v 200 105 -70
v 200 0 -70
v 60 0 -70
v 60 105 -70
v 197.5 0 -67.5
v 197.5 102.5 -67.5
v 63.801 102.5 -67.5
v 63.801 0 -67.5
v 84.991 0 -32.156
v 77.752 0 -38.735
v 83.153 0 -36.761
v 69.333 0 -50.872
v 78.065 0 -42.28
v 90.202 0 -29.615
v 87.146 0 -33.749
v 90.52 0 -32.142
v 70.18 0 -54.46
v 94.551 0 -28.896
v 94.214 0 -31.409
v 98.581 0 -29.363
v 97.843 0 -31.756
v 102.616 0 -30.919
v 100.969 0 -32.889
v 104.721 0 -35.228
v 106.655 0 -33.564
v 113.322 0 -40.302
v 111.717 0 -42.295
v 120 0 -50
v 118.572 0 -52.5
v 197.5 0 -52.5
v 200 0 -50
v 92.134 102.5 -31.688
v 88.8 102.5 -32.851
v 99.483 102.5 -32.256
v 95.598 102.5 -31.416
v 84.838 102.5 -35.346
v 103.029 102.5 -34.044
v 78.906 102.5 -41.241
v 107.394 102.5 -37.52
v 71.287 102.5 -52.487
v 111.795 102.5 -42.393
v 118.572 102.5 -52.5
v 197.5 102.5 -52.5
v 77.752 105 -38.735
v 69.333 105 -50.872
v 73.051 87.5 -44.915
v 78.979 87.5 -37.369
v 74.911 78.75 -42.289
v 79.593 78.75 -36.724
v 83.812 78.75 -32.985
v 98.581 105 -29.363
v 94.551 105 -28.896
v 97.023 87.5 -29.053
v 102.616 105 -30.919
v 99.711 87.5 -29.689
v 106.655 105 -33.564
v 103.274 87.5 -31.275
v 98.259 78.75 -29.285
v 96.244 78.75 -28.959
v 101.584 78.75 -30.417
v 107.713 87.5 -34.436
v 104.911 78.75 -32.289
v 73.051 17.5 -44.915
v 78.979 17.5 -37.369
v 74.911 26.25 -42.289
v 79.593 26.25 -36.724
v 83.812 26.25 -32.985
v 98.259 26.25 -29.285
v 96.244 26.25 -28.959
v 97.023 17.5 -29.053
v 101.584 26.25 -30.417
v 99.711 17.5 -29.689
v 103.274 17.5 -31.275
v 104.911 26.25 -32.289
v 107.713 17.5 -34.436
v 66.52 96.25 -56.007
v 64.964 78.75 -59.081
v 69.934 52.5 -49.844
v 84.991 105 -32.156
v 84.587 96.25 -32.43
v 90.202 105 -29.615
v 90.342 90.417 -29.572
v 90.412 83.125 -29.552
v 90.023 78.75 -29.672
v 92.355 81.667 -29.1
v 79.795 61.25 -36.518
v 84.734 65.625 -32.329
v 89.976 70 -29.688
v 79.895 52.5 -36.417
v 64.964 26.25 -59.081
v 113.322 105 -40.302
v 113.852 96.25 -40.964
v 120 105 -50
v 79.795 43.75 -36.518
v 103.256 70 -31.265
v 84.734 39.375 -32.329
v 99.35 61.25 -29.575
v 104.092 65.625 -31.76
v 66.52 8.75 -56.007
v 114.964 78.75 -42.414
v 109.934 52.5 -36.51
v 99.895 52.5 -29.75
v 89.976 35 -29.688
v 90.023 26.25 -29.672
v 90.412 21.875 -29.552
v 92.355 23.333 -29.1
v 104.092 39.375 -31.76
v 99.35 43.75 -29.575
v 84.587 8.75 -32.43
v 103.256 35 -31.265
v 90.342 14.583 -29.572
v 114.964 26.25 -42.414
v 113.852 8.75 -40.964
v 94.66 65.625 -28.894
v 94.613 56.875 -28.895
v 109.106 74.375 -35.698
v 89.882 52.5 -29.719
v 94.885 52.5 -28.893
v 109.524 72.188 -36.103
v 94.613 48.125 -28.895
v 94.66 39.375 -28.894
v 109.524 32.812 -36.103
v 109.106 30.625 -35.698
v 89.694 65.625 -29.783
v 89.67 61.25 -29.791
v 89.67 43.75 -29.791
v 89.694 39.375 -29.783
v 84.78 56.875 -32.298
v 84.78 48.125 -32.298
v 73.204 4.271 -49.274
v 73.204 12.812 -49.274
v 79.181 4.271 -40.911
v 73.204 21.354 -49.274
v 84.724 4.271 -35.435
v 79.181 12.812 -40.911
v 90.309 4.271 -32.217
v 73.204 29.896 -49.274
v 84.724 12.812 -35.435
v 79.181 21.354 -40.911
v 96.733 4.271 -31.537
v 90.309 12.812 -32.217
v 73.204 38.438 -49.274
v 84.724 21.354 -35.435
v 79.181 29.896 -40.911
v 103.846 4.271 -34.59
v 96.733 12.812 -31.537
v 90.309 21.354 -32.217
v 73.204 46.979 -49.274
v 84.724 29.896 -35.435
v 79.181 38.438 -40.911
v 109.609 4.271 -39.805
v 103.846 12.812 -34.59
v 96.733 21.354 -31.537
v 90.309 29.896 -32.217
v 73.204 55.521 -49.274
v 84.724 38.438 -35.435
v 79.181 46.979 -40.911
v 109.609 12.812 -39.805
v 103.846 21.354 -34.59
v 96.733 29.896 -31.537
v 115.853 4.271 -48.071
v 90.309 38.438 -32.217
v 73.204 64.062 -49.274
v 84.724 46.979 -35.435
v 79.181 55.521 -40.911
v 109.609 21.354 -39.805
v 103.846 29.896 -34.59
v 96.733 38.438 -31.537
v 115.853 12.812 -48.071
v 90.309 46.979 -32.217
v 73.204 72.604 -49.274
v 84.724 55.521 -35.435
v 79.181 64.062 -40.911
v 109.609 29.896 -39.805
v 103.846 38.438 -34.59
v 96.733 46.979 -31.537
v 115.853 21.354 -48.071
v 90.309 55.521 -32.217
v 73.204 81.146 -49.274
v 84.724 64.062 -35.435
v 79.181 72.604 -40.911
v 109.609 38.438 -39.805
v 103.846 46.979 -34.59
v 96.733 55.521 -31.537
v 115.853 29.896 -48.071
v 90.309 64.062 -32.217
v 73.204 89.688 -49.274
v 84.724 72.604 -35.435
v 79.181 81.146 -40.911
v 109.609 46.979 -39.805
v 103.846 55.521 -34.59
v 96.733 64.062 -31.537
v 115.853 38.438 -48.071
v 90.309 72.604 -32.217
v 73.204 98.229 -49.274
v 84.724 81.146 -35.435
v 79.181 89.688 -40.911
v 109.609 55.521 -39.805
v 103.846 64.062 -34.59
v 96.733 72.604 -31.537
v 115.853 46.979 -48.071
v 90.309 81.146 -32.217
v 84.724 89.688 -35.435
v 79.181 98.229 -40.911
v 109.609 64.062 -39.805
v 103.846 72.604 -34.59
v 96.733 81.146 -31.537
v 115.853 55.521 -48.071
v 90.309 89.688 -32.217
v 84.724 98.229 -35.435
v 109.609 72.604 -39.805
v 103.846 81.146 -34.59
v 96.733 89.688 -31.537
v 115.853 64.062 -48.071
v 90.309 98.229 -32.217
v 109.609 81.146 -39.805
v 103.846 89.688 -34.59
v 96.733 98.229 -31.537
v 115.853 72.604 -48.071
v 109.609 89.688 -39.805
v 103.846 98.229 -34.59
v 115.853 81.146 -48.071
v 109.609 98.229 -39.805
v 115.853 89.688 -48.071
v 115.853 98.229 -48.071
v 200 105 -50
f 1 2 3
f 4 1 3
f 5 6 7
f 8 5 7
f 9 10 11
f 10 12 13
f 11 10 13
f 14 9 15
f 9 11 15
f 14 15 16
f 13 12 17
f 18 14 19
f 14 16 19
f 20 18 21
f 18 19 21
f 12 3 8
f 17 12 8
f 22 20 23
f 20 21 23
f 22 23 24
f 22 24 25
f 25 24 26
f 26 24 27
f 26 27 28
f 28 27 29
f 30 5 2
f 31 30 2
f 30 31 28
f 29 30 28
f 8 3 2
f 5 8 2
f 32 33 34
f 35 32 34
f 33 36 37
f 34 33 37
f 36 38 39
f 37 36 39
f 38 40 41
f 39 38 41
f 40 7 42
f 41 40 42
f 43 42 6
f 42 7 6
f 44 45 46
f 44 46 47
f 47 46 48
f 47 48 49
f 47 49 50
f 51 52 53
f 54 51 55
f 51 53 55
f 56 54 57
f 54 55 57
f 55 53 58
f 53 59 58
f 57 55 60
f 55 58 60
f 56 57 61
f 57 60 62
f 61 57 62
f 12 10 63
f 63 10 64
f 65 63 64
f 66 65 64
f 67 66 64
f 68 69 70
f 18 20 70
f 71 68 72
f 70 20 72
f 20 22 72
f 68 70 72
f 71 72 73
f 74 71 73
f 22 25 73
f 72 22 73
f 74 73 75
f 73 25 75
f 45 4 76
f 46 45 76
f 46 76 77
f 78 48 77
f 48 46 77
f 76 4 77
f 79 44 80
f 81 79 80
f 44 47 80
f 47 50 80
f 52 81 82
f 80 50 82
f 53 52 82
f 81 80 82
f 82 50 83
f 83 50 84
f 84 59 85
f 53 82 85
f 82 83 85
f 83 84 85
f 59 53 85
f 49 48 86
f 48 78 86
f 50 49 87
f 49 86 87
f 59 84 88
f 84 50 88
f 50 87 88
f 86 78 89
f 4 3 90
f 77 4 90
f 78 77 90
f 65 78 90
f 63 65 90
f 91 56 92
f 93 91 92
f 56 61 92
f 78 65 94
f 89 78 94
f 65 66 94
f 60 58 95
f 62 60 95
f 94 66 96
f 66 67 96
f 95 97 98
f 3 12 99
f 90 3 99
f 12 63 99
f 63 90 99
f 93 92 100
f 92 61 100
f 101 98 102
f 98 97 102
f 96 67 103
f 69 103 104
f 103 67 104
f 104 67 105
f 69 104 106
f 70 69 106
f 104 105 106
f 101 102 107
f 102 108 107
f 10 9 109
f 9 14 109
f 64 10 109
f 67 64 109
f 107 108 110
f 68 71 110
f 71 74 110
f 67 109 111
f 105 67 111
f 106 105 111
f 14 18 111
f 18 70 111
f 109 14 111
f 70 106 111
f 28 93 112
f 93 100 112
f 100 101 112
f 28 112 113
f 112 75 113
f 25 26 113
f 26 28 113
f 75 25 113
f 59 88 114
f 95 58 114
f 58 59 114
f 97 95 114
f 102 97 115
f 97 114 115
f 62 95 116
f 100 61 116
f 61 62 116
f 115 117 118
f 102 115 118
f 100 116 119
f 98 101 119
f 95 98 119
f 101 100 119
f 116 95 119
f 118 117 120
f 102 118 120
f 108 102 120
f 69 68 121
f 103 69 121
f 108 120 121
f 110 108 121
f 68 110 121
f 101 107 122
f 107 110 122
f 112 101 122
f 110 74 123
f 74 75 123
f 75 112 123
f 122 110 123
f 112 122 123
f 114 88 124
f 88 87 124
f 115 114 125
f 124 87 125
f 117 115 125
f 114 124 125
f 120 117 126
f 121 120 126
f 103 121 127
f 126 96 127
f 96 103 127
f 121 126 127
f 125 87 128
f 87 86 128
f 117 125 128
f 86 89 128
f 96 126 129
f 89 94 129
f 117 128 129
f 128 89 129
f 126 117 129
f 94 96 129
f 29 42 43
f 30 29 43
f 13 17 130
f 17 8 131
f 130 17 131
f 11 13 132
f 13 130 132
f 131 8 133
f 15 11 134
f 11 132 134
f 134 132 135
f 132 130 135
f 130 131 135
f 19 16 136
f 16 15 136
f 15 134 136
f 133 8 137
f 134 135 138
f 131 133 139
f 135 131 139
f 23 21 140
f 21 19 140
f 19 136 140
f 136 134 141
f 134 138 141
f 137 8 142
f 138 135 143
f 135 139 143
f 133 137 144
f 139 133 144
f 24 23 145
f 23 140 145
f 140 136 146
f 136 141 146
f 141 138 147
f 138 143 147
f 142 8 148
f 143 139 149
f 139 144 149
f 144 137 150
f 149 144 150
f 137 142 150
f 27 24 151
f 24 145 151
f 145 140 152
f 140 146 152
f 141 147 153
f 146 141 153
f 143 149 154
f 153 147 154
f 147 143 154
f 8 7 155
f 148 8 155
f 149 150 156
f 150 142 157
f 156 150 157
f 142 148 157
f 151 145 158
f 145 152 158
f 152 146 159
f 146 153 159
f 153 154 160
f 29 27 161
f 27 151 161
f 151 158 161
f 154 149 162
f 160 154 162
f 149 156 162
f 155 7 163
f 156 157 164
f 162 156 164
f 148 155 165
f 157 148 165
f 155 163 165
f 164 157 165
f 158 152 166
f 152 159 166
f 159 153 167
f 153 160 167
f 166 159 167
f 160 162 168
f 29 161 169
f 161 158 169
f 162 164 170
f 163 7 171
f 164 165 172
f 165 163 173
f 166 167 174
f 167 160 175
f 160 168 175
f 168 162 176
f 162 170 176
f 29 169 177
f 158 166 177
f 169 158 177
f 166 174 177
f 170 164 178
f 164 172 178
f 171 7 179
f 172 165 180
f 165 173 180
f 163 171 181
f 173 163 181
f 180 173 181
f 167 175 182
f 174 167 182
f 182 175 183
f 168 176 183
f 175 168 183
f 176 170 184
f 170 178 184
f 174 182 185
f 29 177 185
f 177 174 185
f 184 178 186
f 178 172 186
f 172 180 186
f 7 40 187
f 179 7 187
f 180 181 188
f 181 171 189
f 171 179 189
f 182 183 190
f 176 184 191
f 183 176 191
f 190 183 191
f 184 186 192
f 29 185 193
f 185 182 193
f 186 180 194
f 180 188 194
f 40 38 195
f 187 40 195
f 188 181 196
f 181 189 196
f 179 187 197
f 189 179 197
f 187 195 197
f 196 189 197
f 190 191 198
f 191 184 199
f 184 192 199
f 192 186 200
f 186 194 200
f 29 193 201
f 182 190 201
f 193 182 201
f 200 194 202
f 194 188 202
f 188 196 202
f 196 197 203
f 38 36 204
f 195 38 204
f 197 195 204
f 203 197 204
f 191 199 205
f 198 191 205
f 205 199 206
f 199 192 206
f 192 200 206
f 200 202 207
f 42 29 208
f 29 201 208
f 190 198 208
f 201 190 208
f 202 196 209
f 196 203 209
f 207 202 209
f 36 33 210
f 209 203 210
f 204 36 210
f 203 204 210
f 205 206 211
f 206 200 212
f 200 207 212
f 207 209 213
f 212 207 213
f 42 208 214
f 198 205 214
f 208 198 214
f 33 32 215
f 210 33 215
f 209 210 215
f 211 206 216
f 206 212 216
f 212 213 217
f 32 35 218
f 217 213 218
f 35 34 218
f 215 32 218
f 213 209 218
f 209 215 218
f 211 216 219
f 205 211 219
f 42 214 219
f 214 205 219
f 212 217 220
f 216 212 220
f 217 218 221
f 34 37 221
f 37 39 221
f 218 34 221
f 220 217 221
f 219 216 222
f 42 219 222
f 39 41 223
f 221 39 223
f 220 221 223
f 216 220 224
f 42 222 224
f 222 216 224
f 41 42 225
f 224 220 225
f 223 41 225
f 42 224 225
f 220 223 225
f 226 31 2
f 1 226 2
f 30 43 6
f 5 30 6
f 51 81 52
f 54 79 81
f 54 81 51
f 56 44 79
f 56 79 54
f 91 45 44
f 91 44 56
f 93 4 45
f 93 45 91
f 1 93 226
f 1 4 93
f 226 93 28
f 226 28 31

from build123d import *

# Parameters (mm, degrees)
SALIENTE_EXTRUIR1_DEPTH = 105
CORTAR_EXTRUIR2_START   = -2.5
CORTAR_EXTRUIR2_DEPTH   = 234.984671966


with BuildPart() as part:
    # Croquis2 → Saliente-Extruir1 (new body)
    with BuildSketch(Plane(origin=(0, 0, 0), x_dir=(1, 0, 0), z_dir=(0, 1, 0))):
        with BuildLine():
            Line((120, 70), (60, 70))
            add(Edge.make_bspline(
                [(60, 70), (89.76394683, -0.562785514), (120, 50)],
                knots=[0, 0, 0, 1, 1, 1], degree=2))
            Line((120, 50), (200, 50))
            Line((200, 50), (200, 70))
            Line((200, 70), (120, 70))
        make_face()
    extrude(amount=SALIENTE_EXTRUIR1_DEPTH)

    # Croquis4 → Cortar-Extruir2 (cut, through all)
    with BuildSketch(Plane(origin=(0, 105, 0), x_dir=(1, 0, 0), z_dir=(0, 1, 0)).offset(CORTAR_EXTRUIR2_START)):
        with BuildLine():
            Line((197.5, 67.5), (63.800779649, 67.5))
            add(Edge.make_bspline(
                [(63.800779649, 67.5), (65.18783691, 64.356396301), (66.644103156, 61.253475495), (69.752132806, 55.162552342), (71.402228827, 52.173569863), (74.104640396, 47.823690083), (75.043800331, 46.396276886), (77.024901029, 43.601867812), (78.066336024, 42.234574631), (79.738902554, 40.248539184), (80.316176798, 39.596382507), (81.504384845, 38.332520032), (82.11635398, 37.719397568), (83.384216047, 36.539396559), (84.04003863, 35.972443948), (85.407527446, 34.897332122), (86.114894929, 34.392932493), (87.573600332, 33.476694566), (88.326730919, 33.06323511), (89.501825231, 32.528313039), (89.901127997, 32.364288721), (90.717167486, 32.068984459), (91.136369007, 31.937111718), (92.403530819, 31.603509814), (93.258287044, 31.463528395), (94.556784576, 31.38866897), (94.992343306, 31.386226518), (95.869119285, 31.428064625), (96.30369887, 31.472081043), (97.591411513, 31.668142007), (98.431031327, 31.884173903), (99.666193937, 32.318036143), (100.074177189, 32.481317006), (100.869237422, 32.83523612), (101.258207725, 33.026473629), (102.402774127, 33.637457272), (103.136178711, 34.094219324), (104.201442555, 34.837481327), (104.550679955, 35.094994167), (105.238639259, 35.627559919), (105.577699644, 35.90295294), (107.2354852, 37.307560104), (108.455990571, 38.526129809), (110.76276443, 41.083743665), (111.847843608, 42.423855195), (113.920848072, 45.191271588), (114.908562721, 46.619572225), (116.797531302, 49.523204728), (117.700689072, 51.001365908), (118.571731582, 52.5)],
                knots=[0, 0, 0, 0, 0.125, 0.125, 0.25, 0.25, 0.3125, 0.3125, 0.375, 0.375, 0.40625, 0.40625, 0.4375, 0.4375, 0.46875, 0.46875, 0.5, 0.5, 0.53125, 0.53125, 0.546875, 0.546875, 0.5625, 0.5625, 0.59375, 0.59375, 0.609375, 0.609375, 0.625, 0.625, 0.65625, 0.65625, 0.671875, 0.671875, 0.6875, 0.6875, 0.71875, 0.71875, 0.734375, 0.734375, 0.75, 0.75, 0.8125, 0.8125, 0.875, 0.875, 0.9375, 0.9375, 1, 1, 1, 1], degree=3))
            Line((118.571731582, 52.5), (197.5, 52.5))
            Line((197.5, 52.5), (197.5, 67.5))
        make_face()
    extrude(amount=-CORTAR_EXTRUIR2_DEPTH, mode=Mode.SUBTRACT)


solid = part.part
